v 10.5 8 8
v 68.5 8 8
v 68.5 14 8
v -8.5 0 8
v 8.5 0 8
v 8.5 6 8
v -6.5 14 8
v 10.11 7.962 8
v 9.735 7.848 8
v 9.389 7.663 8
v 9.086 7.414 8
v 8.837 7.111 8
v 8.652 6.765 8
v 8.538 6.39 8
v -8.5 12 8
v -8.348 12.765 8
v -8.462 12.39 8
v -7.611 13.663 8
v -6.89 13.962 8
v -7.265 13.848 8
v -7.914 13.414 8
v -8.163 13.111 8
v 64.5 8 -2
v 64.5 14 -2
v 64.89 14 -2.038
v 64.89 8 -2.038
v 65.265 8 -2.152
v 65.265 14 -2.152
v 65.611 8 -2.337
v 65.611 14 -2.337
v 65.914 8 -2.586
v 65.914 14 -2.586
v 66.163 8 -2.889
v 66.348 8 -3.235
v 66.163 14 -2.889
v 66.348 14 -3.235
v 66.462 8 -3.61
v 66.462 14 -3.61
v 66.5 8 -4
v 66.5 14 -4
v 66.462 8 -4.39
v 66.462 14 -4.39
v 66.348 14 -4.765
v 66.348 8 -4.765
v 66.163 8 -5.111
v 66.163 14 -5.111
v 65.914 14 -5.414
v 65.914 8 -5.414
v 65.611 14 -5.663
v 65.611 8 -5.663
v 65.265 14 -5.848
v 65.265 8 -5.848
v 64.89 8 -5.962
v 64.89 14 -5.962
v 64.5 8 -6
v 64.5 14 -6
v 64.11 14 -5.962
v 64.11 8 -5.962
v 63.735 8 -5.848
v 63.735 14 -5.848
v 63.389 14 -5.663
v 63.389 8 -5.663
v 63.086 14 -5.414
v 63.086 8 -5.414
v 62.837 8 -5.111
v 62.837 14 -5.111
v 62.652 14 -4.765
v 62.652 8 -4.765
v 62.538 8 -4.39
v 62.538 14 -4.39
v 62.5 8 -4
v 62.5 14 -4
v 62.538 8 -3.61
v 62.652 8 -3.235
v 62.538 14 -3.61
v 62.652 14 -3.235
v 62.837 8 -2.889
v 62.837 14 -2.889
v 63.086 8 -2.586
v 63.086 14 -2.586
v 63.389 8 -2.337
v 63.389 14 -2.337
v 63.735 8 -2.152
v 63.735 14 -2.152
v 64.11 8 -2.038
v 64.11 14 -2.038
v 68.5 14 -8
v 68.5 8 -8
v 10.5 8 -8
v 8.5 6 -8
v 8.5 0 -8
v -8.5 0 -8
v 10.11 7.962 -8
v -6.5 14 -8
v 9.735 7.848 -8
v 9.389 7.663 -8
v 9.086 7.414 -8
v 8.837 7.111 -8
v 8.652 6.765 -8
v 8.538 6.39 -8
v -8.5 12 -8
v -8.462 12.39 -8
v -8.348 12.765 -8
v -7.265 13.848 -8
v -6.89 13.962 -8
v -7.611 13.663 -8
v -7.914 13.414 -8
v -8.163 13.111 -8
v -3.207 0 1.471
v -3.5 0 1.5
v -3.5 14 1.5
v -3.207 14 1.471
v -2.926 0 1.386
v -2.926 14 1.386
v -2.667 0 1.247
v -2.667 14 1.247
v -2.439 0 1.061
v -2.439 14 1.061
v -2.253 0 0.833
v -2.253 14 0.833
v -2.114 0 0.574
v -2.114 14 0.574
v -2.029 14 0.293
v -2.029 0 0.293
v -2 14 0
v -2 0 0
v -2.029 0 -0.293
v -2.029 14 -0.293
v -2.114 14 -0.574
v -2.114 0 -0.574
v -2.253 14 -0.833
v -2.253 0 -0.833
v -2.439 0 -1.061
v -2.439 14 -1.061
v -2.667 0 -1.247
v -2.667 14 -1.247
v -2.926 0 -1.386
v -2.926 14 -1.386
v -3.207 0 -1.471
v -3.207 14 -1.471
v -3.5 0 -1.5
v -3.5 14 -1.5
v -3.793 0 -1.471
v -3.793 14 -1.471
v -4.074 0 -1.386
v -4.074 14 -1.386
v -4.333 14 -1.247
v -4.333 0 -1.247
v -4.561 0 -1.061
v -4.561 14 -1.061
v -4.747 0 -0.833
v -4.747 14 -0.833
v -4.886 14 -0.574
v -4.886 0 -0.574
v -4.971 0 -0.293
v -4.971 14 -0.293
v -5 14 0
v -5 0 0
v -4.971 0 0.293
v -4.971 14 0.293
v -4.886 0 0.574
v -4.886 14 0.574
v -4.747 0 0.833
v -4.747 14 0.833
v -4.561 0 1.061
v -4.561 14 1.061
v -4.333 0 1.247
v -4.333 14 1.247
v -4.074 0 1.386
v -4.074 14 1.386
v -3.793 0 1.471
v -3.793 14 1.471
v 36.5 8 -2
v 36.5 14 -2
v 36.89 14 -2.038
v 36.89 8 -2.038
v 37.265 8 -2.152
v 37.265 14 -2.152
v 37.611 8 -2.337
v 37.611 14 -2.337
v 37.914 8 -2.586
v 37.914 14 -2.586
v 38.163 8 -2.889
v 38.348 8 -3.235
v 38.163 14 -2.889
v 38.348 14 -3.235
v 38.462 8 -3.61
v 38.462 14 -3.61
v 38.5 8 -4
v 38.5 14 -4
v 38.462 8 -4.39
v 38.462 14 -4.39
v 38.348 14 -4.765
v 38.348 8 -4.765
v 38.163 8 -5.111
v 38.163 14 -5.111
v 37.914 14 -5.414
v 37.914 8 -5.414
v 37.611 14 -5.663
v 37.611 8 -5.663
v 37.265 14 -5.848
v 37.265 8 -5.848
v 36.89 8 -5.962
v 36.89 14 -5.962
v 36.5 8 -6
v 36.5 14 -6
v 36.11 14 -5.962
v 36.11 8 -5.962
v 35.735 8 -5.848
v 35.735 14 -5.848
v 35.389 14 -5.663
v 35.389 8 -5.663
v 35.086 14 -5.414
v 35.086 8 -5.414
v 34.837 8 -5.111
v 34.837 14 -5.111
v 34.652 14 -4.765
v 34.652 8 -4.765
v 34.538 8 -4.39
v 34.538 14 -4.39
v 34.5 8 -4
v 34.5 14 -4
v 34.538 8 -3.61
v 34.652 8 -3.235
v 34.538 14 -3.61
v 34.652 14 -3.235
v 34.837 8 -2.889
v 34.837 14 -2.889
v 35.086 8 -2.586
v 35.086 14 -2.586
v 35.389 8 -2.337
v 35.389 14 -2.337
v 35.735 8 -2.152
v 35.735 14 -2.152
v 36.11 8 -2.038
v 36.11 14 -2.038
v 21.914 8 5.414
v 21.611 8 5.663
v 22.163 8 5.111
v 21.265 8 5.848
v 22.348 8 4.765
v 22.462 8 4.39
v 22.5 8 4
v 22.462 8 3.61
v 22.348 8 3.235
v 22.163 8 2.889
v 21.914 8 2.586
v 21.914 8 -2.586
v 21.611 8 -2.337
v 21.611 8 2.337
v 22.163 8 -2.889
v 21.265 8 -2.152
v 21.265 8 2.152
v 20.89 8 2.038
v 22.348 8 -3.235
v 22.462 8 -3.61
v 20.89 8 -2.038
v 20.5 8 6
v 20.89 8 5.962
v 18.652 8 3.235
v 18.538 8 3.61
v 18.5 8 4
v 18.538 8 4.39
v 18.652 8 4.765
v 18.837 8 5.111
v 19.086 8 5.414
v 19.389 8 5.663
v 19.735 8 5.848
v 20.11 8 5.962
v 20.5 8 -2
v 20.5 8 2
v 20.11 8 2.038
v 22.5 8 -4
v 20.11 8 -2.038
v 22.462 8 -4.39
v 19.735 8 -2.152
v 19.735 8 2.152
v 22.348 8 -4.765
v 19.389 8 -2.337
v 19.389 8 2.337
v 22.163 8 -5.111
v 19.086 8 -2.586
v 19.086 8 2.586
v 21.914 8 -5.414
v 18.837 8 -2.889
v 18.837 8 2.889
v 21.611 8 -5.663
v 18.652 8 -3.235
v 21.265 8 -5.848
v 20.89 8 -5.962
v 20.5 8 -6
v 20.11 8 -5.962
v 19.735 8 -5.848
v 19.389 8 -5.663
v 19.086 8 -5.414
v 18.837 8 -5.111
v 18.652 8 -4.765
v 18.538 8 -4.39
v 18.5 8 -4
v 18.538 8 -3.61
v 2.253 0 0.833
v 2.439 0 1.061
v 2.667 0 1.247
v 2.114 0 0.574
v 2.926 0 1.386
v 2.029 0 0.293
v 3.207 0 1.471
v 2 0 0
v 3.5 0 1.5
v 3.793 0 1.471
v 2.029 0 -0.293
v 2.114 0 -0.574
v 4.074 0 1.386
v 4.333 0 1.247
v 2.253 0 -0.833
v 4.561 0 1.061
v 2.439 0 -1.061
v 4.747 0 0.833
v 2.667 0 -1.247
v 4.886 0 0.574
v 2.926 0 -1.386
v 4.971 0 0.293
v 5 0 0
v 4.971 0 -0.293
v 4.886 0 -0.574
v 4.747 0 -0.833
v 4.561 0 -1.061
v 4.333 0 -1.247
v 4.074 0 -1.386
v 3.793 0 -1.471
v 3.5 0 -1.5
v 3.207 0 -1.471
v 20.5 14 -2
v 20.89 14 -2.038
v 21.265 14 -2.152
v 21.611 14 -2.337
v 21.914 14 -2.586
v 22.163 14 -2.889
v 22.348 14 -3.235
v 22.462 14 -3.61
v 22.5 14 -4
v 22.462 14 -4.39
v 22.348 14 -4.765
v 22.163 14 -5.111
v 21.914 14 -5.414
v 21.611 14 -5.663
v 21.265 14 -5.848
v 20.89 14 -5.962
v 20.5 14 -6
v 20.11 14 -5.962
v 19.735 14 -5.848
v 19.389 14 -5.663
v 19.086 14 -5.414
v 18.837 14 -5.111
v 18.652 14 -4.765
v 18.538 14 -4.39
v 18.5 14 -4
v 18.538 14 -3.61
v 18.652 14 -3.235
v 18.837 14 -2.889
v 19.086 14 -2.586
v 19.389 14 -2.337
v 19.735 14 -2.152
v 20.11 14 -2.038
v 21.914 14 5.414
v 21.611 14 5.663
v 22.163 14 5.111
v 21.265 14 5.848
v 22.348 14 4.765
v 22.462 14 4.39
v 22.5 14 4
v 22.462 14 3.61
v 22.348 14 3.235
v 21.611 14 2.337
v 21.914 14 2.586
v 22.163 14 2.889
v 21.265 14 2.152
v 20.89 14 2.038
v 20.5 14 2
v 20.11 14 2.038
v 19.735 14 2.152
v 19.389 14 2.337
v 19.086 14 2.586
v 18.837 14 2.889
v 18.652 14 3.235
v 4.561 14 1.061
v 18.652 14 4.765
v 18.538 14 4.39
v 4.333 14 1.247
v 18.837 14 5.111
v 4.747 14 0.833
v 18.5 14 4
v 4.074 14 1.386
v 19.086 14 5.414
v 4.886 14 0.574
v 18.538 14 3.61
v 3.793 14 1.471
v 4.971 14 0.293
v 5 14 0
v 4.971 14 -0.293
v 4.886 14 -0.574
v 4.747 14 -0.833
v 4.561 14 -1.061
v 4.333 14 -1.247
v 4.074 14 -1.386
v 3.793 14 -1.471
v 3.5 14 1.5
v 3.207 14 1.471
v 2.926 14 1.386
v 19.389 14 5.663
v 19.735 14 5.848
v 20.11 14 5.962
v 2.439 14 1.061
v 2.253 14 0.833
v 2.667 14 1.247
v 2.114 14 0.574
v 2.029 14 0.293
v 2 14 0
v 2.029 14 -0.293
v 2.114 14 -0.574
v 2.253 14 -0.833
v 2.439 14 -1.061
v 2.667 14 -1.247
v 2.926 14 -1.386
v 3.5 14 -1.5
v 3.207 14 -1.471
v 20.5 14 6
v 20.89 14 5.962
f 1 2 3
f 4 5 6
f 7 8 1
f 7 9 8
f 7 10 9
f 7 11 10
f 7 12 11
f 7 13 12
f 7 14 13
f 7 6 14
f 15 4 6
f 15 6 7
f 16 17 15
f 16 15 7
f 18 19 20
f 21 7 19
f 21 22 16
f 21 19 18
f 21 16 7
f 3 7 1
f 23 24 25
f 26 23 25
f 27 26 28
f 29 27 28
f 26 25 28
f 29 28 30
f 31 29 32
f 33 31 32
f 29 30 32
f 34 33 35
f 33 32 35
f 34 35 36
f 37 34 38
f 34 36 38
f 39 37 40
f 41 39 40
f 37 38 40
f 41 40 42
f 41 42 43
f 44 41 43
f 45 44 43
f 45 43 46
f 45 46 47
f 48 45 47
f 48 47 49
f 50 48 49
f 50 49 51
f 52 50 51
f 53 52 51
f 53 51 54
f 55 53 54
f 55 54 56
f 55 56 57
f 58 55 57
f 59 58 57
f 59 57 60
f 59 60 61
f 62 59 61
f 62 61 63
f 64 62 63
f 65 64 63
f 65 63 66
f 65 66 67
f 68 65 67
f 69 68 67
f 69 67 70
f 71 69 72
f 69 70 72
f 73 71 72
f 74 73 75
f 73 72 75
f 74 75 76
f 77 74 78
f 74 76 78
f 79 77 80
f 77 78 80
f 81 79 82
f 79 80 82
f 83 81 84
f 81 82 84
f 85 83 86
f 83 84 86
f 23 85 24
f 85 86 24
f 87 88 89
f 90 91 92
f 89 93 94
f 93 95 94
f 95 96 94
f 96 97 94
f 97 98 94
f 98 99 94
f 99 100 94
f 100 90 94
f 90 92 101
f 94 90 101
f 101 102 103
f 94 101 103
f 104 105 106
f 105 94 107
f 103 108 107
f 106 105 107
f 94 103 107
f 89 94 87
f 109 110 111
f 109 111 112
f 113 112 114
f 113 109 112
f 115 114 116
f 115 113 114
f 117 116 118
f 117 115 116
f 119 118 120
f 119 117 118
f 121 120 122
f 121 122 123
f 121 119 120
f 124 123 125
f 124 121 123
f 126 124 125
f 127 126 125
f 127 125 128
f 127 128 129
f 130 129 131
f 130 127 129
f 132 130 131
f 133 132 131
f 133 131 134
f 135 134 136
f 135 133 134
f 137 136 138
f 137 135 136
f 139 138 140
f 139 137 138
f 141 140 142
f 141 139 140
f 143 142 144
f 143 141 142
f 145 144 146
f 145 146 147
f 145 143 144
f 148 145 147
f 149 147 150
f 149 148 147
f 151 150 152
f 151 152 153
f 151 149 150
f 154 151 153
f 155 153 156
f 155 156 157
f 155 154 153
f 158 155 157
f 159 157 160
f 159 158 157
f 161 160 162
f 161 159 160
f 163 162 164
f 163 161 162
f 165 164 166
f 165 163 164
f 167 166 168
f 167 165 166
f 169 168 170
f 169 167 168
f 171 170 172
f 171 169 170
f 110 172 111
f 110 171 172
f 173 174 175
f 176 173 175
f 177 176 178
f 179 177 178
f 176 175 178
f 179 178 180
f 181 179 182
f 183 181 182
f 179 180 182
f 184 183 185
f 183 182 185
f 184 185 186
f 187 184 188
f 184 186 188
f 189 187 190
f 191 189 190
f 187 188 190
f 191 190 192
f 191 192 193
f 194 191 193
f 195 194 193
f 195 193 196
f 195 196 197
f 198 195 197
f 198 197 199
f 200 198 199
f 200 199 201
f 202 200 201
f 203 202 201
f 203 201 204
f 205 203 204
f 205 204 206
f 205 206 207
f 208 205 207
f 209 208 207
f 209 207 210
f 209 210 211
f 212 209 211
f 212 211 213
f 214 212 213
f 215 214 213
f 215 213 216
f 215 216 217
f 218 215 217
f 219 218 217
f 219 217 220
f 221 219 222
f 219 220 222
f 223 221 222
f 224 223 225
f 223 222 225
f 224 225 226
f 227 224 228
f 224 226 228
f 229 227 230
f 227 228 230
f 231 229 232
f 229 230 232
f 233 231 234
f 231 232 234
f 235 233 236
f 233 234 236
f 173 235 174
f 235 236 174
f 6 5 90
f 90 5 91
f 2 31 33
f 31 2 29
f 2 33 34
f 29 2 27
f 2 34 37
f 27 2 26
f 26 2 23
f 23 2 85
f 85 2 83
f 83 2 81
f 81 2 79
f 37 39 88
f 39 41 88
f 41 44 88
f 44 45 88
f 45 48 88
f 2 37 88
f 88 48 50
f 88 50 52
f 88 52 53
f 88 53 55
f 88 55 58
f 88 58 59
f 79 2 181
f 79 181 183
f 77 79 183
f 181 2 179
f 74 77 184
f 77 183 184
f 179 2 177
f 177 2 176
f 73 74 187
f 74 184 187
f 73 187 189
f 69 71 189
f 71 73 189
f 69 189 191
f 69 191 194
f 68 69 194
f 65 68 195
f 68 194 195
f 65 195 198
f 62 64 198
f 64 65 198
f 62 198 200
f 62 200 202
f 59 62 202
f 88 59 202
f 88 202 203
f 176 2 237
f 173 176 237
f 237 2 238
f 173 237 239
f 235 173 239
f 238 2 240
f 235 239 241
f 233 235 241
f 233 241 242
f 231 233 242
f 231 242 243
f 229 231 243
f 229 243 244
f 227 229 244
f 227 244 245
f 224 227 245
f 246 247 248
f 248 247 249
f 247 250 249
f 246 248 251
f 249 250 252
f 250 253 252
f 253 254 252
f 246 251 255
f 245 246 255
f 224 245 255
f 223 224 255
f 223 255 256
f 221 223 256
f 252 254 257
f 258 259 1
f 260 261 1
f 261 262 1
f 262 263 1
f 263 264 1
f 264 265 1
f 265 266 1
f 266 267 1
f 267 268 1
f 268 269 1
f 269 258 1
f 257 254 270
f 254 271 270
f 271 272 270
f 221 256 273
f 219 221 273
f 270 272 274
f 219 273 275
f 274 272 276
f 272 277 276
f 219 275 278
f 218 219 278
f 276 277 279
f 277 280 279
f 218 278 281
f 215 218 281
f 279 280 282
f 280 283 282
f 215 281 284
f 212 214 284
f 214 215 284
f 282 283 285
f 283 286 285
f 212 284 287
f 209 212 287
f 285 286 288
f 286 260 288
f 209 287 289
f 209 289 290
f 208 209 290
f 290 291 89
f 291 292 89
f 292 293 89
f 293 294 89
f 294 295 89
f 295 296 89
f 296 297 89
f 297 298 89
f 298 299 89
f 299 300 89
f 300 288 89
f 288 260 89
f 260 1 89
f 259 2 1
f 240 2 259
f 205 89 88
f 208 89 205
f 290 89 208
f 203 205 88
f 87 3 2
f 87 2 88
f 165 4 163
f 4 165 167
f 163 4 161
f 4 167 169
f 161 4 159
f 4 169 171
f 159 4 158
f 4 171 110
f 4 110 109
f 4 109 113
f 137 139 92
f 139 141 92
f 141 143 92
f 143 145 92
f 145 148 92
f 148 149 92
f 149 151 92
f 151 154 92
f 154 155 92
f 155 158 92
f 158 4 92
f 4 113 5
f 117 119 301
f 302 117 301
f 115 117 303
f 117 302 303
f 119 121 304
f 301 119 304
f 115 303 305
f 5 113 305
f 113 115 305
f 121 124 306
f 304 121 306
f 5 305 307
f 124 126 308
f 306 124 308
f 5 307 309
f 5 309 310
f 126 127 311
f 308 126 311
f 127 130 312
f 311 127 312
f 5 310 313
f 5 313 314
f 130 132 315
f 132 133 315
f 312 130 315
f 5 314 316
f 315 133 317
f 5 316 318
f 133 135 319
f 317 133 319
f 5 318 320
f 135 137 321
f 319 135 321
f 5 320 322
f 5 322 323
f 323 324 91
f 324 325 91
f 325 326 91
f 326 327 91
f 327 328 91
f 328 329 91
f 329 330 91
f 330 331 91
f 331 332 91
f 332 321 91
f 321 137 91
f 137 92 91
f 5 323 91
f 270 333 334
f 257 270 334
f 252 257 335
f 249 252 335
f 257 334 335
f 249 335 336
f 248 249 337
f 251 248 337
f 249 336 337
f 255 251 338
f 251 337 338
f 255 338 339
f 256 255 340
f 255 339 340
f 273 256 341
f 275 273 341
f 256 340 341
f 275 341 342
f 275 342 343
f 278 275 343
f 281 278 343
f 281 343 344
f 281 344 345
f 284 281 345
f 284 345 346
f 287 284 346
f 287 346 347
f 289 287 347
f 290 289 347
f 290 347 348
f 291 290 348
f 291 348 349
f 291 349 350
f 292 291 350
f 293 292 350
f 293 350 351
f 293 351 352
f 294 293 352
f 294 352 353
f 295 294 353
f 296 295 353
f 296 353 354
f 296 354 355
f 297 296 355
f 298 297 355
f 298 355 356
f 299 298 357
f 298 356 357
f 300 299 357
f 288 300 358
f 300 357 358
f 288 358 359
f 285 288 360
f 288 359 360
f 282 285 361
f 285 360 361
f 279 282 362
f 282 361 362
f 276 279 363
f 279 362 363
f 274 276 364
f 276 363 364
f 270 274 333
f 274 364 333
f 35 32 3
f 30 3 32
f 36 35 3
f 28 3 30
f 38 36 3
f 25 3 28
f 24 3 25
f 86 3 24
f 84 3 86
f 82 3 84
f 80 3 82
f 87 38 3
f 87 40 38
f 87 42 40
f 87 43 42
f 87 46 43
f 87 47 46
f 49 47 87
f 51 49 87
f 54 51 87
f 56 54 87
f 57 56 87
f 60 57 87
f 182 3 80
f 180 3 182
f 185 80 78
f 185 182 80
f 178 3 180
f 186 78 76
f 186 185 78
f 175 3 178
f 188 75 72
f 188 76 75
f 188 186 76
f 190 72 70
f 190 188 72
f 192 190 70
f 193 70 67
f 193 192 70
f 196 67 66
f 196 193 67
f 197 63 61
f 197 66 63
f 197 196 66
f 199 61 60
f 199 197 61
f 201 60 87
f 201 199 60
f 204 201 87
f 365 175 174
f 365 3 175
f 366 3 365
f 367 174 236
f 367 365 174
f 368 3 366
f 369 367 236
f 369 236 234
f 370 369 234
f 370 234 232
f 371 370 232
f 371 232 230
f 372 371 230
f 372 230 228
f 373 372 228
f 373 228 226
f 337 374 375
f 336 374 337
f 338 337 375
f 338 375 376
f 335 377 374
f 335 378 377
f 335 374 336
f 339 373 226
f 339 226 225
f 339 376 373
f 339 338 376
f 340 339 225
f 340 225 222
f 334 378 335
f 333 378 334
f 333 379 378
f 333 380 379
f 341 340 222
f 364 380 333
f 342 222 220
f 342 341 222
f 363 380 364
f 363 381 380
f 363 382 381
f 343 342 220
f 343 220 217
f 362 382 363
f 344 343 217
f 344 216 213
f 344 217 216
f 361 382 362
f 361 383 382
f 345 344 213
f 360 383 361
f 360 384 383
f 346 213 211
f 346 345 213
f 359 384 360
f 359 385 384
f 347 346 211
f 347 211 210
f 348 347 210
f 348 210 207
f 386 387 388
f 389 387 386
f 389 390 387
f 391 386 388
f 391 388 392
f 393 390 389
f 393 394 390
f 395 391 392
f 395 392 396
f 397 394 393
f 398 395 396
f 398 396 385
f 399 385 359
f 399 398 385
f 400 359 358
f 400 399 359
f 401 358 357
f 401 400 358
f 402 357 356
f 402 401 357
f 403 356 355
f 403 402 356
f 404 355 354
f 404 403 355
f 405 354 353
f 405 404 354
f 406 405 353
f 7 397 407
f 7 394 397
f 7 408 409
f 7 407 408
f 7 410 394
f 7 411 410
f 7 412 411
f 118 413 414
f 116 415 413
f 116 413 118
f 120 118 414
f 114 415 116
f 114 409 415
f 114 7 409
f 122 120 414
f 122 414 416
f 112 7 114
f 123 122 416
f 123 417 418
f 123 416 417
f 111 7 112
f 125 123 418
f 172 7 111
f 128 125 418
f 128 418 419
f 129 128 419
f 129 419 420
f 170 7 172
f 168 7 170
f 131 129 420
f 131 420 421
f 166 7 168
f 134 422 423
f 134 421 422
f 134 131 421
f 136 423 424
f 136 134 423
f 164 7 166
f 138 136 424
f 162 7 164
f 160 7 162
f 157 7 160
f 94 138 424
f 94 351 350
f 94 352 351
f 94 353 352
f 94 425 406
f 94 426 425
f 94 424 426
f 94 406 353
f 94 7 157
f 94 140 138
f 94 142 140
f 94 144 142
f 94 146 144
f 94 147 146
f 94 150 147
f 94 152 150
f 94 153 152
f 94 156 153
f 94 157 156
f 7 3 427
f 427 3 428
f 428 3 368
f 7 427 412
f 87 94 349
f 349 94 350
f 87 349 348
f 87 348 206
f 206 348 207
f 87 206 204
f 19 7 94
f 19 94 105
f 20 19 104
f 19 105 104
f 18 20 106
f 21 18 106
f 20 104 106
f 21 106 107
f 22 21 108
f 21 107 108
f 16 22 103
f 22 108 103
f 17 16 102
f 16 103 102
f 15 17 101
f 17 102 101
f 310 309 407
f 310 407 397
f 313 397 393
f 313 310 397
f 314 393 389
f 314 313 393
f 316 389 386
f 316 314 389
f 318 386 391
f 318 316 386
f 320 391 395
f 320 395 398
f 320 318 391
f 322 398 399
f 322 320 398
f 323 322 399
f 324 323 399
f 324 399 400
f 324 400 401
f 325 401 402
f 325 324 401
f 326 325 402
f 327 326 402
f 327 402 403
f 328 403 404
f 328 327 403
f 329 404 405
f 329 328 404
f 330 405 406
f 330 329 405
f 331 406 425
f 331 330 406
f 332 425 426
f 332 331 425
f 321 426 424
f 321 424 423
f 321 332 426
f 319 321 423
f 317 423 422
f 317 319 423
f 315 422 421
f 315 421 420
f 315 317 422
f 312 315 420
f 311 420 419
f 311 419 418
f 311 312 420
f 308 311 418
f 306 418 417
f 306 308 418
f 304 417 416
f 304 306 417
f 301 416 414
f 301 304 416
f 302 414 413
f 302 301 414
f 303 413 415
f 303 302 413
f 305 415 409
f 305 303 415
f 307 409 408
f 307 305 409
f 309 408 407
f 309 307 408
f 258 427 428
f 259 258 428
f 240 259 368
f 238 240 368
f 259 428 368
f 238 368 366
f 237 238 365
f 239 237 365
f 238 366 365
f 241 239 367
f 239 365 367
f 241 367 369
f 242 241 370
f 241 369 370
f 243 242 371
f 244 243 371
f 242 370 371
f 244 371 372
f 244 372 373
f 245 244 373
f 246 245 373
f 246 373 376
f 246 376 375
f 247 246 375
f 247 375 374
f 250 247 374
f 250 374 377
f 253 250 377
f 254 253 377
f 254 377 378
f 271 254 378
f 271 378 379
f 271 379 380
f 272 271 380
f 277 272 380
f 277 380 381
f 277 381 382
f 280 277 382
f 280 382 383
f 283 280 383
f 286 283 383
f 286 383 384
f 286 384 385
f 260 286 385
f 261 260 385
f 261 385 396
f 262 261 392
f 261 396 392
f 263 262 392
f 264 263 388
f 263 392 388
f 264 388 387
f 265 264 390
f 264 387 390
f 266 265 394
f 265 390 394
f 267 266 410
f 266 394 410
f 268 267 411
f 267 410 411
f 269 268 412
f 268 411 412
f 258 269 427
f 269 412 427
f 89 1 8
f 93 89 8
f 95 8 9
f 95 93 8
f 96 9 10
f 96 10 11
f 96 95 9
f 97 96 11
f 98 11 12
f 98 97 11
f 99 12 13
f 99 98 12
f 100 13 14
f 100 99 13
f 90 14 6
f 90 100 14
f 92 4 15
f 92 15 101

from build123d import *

# Parameters (mm, degrees)
SKETCH1_W           = 17
SKETCH1_H           = 16
SKETCH1_R           = 1.5
BOSS_EXTRUDE1_DEPTH = 14
SKETCH3_W           = 16
SKETCH3_H           = 6
BOSS_EXTRUDE2_DEPTH = 60
SKETCH4_R           = 2
CUT_EXTRUDE1_DEPTH  = 71.372224634
FILLET1_R           = 2
FILLET2_R           = 2


with BuildPart() as part:
    # Sketch1 → Boss-Extrude1 (new body)
    with BuildSketch(Plane(origin=(0, 0, 0), x_dir=(1, 0, 0), z_dir=(0, 1, 0))):
        Rectangle(SKETCH1_W, SKETCH1_H)
        with Locations(Location((-3.5, 0, 0), (0, 0, 270))):
            Circle(SKETCH1_R, mode=Mode.SUBTRACT)
        with Locations(Location((3.5, 0, 0), (0, 0, 270))):
            Circle(SKETCH1_R, mode=Mode.SUBTRACT)
    extrude(amount=BOSS_EXTRUDE1_DEPTH)

    # Sketch3 → Boss-Extrude2 (add)
    with BuildSketch(Plane(origin=(8.5, 0, 0), x_dir=(0, 0, -1), z_dir=(1, 0, 0))):
        with Locations((0, 11)):
            Rectangle(SKETCH3_W, SKETCH3_H)
    extrude(amount=BOSS_EXTRUDE2_DEPTH)

    # Sketch4 → Cut-Extrude1 (cut, through all)
    with BuildSketch(Plane(origin=(0, 14, 0), x_dir=(1, 0, 0), z_dir=(0, 1, 0))):
        with Locations(Location((36.5, 4, 0), (0, 0, 270))):
            Circle(SKETCH4_R)
        with Locations(Location((64.5, 4, 0), (0, 0, 270))):
            Circle(SKETCH4_R)
        with Locations(Location((20.5, 4, 0), (0, 0, 270))):
            Circle(SKETCH4_R)
        with Locations(Location((20.5, -4, 0), (0, 0, 270))):
            Circle(SKETCH4_R)
    extrude(amount=-CUT_EXTRUDE1_DEPTH, mode=Mode.SUBTRACT)

    # Fillet1
    fillet1_edges = [part.edges().sort_by_distance(p)[0] for p in [
        (8.5, 8, 0),
    ]]
    fillet(fillet1_edges, radius=FILLET1_R)

    # Fillet2
    fillet2_edges = [part.edges().sort_by_distance(p)[0] for p in [
        (-8.5, 14, 0),
    ]]
    fillet(fillet2_edges, radius=FILLET2_R)


solid = part.part
